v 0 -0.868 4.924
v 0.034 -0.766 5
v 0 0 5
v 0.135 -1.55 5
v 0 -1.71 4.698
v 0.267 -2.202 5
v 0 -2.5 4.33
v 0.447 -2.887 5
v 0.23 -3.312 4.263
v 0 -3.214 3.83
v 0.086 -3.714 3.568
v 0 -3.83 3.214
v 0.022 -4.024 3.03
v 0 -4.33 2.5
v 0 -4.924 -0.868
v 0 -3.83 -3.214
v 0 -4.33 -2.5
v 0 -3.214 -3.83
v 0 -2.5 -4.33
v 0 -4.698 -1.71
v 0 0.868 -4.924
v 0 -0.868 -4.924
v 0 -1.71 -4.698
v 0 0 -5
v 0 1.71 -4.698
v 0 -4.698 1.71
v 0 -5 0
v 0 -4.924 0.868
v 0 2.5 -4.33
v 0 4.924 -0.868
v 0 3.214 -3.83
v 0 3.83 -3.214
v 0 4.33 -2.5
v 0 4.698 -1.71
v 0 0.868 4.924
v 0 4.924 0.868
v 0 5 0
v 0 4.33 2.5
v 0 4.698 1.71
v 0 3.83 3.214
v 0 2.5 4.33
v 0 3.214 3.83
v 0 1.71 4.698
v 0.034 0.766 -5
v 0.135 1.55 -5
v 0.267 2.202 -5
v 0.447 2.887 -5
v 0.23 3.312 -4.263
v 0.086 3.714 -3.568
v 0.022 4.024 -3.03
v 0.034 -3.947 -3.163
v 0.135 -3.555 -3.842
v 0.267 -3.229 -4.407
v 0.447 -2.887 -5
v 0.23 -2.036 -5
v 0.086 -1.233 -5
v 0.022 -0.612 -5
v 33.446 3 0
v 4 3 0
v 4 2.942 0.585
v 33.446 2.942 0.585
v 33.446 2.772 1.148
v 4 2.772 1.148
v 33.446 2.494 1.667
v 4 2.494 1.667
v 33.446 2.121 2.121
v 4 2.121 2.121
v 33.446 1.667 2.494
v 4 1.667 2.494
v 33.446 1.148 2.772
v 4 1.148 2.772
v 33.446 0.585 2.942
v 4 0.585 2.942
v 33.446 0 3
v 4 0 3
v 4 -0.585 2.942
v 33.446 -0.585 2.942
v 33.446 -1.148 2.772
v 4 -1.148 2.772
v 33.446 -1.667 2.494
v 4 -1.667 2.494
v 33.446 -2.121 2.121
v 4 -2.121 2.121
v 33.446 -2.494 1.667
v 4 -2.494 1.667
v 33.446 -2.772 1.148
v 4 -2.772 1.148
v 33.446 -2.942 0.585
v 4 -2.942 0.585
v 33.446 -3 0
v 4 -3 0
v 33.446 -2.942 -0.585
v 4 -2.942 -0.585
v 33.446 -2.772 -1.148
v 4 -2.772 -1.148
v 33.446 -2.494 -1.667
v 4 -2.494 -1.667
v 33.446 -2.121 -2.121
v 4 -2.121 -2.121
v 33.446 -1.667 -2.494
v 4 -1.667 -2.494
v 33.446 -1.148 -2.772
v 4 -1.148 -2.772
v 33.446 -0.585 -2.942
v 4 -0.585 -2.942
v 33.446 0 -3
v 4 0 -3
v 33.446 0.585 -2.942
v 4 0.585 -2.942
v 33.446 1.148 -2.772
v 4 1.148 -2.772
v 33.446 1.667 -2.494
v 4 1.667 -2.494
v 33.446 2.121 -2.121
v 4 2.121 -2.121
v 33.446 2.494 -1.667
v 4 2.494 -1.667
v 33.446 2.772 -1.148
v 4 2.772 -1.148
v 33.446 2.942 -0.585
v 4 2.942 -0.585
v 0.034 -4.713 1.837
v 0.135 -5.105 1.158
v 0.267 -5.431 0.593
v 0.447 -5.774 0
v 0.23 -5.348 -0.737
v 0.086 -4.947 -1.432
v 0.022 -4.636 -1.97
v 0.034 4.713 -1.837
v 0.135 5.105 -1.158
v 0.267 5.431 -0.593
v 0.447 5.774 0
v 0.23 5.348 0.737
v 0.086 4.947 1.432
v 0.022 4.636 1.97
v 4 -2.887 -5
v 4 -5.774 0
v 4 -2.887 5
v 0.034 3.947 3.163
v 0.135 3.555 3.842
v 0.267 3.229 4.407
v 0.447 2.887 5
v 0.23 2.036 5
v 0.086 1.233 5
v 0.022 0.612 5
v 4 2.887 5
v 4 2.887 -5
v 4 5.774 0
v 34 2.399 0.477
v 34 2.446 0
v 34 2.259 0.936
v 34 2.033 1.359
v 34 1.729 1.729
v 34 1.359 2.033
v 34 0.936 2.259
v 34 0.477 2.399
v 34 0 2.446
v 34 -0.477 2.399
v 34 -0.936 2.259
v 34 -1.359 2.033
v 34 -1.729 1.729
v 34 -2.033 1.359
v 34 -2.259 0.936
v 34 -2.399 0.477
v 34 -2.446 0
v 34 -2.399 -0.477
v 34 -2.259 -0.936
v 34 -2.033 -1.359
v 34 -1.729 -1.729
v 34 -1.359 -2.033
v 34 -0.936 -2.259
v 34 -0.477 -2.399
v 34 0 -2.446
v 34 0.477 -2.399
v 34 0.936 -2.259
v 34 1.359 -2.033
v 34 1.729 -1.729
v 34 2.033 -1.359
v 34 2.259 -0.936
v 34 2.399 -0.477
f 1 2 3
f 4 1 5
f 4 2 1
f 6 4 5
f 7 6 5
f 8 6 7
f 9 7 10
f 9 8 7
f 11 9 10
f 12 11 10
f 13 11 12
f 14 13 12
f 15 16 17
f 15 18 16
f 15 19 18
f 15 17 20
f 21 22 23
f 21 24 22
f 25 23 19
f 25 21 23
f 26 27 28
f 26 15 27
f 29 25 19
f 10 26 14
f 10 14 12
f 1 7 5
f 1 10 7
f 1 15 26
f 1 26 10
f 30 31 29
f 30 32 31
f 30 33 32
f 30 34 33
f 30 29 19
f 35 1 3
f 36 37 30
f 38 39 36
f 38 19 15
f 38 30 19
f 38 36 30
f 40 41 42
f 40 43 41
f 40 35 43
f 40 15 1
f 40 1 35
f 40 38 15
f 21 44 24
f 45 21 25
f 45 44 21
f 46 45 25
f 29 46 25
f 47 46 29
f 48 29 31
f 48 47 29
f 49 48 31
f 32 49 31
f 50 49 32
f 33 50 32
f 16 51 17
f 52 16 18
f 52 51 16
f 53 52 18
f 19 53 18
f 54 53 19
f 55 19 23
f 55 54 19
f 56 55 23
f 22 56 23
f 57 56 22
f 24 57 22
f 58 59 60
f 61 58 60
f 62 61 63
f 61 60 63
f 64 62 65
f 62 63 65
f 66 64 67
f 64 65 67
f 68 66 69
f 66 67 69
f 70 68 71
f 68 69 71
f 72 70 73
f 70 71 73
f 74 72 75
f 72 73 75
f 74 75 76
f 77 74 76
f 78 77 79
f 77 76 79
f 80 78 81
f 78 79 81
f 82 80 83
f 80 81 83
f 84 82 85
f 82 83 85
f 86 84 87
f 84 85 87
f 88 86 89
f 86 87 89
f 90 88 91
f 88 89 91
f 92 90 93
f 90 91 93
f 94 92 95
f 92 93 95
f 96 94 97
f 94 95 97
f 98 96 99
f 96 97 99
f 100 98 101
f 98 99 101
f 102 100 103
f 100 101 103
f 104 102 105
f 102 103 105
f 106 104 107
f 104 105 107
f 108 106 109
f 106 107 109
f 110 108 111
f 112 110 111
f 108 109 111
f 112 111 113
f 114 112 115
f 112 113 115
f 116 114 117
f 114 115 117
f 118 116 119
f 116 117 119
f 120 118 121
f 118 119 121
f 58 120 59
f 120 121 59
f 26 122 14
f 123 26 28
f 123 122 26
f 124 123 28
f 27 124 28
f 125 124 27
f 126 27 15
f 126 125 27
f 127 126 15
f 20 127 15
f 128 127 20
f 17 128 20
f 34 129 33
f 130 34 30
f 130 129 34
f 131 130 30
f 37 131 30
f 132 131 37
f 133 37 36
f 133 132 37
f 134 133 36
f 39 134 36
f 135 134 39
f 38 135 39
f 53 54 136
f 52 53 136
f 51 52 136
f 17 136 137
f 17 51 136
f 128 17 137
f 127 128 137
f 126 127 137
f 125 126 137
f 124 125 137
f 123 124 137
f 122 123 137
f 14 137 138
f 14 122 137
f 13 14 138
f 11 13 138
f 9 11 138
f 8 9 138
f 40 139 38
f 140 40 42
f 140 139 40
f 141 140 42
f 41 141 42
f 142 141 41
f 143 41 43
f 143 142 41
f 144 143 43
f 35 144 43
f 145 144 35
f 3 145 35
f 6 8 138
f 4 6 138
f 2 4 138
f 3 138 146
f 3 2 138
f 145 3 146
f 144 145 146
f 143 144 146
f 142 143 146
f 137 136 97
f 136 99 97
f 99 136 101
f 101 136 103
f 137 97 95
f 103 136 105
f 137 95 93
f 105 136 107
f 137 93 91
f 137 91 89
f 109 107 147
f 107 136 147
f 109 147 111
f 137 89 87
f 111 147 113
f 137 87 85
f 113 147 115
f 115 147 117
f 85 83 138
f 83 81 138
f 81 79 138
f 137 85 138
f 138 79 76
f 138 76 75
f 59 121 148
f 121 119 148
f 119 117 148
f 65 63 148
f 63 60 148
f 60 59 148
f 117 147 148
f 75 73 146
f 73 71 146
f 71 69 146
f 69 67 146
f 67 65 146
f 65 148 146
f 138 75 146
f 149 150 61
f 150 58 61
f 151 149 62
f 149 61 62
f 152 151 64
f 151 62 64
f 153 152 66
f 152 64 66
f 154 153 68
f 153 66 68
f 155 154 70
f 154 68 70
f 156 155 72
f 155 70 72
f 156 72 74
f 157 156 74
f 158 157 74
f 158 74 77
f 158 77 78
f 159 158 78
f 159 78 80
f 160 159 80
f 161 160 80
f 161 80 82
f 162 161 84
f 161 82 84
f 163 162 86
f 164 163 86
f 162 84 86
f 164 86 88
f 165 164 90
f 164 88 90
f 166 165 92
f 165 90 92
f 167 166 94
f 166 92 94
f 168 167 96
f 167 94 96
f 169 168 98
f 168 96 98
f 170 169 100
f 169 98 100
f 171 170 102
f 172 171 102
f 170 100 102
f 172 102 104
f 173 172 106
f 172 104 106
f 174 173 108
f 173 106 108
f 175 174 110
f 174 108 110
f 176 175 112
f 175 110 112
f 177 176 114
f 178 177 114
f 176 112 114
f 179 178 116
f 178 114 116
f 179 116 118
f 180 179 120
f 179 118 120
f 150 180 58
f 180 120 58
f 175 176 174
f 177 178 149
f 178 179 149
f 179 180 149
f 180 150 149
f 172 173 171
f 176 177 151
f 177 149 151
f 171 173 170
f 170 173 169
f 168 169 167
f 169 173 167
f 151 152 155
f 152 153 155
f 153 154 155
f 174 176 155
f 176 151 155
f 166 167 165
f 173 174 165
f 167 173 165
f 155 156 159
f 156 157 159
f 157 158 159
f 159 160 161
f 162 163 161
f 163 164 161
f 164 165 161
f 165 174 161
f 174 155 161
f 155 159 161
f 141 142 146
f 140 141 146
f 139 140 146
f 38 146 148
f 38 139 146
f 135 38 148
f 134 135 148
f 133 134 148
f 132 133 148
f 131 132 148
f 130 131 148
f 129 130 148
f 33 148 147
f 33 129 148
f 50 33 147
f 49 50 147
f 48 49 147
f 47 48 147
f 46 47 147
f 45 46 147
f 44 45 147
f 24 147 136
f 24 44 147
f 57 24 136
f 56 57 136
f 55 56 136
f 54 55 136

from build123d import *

# Parameters (mm, degrees)
BASEHEAD_DEPTH = 4


with BuildPart() as part:
    # Sketch1 → BaseHead (new body)
    with BuildSketch(Plane(origin=(0, 0, 0), x_dir=(0, 0, -1), z_dir=(1, 0, 0))):
        Polygon((5, 2.886751346), (5, -2.886751346), (0, -5.773502692), (-5, -2.886751346), (-5, 2.886751346), (0, 5.773502692), align=None)
    extrude(amount=BASEHEAD_DEPTH)

    # BodySke → BaseBody (revolve)
    with BuildSketch(Plane.XY):
        Polygon((0, 0), (34, 0), (34, 2.4455), (33.4455, 3), (0, 3), align=None)
    revolve(axis=Axis((0, 0, 0), (1, 0, 0)))

    # Sketch3 → HeadChamfer (revolve, cut)
    with BuildSketch(Plane.XY):
        Polygon((0, 5), (3.333333333, 10.773502692), (3.333333333, 15.773502692), (-10, 15.773502692), (-10, 5), align=None)
    revolve(axis=Axis((0, 0, 0), (1, 0, 0)), mode=Mode.SUBTRACT)


solid = part.part
